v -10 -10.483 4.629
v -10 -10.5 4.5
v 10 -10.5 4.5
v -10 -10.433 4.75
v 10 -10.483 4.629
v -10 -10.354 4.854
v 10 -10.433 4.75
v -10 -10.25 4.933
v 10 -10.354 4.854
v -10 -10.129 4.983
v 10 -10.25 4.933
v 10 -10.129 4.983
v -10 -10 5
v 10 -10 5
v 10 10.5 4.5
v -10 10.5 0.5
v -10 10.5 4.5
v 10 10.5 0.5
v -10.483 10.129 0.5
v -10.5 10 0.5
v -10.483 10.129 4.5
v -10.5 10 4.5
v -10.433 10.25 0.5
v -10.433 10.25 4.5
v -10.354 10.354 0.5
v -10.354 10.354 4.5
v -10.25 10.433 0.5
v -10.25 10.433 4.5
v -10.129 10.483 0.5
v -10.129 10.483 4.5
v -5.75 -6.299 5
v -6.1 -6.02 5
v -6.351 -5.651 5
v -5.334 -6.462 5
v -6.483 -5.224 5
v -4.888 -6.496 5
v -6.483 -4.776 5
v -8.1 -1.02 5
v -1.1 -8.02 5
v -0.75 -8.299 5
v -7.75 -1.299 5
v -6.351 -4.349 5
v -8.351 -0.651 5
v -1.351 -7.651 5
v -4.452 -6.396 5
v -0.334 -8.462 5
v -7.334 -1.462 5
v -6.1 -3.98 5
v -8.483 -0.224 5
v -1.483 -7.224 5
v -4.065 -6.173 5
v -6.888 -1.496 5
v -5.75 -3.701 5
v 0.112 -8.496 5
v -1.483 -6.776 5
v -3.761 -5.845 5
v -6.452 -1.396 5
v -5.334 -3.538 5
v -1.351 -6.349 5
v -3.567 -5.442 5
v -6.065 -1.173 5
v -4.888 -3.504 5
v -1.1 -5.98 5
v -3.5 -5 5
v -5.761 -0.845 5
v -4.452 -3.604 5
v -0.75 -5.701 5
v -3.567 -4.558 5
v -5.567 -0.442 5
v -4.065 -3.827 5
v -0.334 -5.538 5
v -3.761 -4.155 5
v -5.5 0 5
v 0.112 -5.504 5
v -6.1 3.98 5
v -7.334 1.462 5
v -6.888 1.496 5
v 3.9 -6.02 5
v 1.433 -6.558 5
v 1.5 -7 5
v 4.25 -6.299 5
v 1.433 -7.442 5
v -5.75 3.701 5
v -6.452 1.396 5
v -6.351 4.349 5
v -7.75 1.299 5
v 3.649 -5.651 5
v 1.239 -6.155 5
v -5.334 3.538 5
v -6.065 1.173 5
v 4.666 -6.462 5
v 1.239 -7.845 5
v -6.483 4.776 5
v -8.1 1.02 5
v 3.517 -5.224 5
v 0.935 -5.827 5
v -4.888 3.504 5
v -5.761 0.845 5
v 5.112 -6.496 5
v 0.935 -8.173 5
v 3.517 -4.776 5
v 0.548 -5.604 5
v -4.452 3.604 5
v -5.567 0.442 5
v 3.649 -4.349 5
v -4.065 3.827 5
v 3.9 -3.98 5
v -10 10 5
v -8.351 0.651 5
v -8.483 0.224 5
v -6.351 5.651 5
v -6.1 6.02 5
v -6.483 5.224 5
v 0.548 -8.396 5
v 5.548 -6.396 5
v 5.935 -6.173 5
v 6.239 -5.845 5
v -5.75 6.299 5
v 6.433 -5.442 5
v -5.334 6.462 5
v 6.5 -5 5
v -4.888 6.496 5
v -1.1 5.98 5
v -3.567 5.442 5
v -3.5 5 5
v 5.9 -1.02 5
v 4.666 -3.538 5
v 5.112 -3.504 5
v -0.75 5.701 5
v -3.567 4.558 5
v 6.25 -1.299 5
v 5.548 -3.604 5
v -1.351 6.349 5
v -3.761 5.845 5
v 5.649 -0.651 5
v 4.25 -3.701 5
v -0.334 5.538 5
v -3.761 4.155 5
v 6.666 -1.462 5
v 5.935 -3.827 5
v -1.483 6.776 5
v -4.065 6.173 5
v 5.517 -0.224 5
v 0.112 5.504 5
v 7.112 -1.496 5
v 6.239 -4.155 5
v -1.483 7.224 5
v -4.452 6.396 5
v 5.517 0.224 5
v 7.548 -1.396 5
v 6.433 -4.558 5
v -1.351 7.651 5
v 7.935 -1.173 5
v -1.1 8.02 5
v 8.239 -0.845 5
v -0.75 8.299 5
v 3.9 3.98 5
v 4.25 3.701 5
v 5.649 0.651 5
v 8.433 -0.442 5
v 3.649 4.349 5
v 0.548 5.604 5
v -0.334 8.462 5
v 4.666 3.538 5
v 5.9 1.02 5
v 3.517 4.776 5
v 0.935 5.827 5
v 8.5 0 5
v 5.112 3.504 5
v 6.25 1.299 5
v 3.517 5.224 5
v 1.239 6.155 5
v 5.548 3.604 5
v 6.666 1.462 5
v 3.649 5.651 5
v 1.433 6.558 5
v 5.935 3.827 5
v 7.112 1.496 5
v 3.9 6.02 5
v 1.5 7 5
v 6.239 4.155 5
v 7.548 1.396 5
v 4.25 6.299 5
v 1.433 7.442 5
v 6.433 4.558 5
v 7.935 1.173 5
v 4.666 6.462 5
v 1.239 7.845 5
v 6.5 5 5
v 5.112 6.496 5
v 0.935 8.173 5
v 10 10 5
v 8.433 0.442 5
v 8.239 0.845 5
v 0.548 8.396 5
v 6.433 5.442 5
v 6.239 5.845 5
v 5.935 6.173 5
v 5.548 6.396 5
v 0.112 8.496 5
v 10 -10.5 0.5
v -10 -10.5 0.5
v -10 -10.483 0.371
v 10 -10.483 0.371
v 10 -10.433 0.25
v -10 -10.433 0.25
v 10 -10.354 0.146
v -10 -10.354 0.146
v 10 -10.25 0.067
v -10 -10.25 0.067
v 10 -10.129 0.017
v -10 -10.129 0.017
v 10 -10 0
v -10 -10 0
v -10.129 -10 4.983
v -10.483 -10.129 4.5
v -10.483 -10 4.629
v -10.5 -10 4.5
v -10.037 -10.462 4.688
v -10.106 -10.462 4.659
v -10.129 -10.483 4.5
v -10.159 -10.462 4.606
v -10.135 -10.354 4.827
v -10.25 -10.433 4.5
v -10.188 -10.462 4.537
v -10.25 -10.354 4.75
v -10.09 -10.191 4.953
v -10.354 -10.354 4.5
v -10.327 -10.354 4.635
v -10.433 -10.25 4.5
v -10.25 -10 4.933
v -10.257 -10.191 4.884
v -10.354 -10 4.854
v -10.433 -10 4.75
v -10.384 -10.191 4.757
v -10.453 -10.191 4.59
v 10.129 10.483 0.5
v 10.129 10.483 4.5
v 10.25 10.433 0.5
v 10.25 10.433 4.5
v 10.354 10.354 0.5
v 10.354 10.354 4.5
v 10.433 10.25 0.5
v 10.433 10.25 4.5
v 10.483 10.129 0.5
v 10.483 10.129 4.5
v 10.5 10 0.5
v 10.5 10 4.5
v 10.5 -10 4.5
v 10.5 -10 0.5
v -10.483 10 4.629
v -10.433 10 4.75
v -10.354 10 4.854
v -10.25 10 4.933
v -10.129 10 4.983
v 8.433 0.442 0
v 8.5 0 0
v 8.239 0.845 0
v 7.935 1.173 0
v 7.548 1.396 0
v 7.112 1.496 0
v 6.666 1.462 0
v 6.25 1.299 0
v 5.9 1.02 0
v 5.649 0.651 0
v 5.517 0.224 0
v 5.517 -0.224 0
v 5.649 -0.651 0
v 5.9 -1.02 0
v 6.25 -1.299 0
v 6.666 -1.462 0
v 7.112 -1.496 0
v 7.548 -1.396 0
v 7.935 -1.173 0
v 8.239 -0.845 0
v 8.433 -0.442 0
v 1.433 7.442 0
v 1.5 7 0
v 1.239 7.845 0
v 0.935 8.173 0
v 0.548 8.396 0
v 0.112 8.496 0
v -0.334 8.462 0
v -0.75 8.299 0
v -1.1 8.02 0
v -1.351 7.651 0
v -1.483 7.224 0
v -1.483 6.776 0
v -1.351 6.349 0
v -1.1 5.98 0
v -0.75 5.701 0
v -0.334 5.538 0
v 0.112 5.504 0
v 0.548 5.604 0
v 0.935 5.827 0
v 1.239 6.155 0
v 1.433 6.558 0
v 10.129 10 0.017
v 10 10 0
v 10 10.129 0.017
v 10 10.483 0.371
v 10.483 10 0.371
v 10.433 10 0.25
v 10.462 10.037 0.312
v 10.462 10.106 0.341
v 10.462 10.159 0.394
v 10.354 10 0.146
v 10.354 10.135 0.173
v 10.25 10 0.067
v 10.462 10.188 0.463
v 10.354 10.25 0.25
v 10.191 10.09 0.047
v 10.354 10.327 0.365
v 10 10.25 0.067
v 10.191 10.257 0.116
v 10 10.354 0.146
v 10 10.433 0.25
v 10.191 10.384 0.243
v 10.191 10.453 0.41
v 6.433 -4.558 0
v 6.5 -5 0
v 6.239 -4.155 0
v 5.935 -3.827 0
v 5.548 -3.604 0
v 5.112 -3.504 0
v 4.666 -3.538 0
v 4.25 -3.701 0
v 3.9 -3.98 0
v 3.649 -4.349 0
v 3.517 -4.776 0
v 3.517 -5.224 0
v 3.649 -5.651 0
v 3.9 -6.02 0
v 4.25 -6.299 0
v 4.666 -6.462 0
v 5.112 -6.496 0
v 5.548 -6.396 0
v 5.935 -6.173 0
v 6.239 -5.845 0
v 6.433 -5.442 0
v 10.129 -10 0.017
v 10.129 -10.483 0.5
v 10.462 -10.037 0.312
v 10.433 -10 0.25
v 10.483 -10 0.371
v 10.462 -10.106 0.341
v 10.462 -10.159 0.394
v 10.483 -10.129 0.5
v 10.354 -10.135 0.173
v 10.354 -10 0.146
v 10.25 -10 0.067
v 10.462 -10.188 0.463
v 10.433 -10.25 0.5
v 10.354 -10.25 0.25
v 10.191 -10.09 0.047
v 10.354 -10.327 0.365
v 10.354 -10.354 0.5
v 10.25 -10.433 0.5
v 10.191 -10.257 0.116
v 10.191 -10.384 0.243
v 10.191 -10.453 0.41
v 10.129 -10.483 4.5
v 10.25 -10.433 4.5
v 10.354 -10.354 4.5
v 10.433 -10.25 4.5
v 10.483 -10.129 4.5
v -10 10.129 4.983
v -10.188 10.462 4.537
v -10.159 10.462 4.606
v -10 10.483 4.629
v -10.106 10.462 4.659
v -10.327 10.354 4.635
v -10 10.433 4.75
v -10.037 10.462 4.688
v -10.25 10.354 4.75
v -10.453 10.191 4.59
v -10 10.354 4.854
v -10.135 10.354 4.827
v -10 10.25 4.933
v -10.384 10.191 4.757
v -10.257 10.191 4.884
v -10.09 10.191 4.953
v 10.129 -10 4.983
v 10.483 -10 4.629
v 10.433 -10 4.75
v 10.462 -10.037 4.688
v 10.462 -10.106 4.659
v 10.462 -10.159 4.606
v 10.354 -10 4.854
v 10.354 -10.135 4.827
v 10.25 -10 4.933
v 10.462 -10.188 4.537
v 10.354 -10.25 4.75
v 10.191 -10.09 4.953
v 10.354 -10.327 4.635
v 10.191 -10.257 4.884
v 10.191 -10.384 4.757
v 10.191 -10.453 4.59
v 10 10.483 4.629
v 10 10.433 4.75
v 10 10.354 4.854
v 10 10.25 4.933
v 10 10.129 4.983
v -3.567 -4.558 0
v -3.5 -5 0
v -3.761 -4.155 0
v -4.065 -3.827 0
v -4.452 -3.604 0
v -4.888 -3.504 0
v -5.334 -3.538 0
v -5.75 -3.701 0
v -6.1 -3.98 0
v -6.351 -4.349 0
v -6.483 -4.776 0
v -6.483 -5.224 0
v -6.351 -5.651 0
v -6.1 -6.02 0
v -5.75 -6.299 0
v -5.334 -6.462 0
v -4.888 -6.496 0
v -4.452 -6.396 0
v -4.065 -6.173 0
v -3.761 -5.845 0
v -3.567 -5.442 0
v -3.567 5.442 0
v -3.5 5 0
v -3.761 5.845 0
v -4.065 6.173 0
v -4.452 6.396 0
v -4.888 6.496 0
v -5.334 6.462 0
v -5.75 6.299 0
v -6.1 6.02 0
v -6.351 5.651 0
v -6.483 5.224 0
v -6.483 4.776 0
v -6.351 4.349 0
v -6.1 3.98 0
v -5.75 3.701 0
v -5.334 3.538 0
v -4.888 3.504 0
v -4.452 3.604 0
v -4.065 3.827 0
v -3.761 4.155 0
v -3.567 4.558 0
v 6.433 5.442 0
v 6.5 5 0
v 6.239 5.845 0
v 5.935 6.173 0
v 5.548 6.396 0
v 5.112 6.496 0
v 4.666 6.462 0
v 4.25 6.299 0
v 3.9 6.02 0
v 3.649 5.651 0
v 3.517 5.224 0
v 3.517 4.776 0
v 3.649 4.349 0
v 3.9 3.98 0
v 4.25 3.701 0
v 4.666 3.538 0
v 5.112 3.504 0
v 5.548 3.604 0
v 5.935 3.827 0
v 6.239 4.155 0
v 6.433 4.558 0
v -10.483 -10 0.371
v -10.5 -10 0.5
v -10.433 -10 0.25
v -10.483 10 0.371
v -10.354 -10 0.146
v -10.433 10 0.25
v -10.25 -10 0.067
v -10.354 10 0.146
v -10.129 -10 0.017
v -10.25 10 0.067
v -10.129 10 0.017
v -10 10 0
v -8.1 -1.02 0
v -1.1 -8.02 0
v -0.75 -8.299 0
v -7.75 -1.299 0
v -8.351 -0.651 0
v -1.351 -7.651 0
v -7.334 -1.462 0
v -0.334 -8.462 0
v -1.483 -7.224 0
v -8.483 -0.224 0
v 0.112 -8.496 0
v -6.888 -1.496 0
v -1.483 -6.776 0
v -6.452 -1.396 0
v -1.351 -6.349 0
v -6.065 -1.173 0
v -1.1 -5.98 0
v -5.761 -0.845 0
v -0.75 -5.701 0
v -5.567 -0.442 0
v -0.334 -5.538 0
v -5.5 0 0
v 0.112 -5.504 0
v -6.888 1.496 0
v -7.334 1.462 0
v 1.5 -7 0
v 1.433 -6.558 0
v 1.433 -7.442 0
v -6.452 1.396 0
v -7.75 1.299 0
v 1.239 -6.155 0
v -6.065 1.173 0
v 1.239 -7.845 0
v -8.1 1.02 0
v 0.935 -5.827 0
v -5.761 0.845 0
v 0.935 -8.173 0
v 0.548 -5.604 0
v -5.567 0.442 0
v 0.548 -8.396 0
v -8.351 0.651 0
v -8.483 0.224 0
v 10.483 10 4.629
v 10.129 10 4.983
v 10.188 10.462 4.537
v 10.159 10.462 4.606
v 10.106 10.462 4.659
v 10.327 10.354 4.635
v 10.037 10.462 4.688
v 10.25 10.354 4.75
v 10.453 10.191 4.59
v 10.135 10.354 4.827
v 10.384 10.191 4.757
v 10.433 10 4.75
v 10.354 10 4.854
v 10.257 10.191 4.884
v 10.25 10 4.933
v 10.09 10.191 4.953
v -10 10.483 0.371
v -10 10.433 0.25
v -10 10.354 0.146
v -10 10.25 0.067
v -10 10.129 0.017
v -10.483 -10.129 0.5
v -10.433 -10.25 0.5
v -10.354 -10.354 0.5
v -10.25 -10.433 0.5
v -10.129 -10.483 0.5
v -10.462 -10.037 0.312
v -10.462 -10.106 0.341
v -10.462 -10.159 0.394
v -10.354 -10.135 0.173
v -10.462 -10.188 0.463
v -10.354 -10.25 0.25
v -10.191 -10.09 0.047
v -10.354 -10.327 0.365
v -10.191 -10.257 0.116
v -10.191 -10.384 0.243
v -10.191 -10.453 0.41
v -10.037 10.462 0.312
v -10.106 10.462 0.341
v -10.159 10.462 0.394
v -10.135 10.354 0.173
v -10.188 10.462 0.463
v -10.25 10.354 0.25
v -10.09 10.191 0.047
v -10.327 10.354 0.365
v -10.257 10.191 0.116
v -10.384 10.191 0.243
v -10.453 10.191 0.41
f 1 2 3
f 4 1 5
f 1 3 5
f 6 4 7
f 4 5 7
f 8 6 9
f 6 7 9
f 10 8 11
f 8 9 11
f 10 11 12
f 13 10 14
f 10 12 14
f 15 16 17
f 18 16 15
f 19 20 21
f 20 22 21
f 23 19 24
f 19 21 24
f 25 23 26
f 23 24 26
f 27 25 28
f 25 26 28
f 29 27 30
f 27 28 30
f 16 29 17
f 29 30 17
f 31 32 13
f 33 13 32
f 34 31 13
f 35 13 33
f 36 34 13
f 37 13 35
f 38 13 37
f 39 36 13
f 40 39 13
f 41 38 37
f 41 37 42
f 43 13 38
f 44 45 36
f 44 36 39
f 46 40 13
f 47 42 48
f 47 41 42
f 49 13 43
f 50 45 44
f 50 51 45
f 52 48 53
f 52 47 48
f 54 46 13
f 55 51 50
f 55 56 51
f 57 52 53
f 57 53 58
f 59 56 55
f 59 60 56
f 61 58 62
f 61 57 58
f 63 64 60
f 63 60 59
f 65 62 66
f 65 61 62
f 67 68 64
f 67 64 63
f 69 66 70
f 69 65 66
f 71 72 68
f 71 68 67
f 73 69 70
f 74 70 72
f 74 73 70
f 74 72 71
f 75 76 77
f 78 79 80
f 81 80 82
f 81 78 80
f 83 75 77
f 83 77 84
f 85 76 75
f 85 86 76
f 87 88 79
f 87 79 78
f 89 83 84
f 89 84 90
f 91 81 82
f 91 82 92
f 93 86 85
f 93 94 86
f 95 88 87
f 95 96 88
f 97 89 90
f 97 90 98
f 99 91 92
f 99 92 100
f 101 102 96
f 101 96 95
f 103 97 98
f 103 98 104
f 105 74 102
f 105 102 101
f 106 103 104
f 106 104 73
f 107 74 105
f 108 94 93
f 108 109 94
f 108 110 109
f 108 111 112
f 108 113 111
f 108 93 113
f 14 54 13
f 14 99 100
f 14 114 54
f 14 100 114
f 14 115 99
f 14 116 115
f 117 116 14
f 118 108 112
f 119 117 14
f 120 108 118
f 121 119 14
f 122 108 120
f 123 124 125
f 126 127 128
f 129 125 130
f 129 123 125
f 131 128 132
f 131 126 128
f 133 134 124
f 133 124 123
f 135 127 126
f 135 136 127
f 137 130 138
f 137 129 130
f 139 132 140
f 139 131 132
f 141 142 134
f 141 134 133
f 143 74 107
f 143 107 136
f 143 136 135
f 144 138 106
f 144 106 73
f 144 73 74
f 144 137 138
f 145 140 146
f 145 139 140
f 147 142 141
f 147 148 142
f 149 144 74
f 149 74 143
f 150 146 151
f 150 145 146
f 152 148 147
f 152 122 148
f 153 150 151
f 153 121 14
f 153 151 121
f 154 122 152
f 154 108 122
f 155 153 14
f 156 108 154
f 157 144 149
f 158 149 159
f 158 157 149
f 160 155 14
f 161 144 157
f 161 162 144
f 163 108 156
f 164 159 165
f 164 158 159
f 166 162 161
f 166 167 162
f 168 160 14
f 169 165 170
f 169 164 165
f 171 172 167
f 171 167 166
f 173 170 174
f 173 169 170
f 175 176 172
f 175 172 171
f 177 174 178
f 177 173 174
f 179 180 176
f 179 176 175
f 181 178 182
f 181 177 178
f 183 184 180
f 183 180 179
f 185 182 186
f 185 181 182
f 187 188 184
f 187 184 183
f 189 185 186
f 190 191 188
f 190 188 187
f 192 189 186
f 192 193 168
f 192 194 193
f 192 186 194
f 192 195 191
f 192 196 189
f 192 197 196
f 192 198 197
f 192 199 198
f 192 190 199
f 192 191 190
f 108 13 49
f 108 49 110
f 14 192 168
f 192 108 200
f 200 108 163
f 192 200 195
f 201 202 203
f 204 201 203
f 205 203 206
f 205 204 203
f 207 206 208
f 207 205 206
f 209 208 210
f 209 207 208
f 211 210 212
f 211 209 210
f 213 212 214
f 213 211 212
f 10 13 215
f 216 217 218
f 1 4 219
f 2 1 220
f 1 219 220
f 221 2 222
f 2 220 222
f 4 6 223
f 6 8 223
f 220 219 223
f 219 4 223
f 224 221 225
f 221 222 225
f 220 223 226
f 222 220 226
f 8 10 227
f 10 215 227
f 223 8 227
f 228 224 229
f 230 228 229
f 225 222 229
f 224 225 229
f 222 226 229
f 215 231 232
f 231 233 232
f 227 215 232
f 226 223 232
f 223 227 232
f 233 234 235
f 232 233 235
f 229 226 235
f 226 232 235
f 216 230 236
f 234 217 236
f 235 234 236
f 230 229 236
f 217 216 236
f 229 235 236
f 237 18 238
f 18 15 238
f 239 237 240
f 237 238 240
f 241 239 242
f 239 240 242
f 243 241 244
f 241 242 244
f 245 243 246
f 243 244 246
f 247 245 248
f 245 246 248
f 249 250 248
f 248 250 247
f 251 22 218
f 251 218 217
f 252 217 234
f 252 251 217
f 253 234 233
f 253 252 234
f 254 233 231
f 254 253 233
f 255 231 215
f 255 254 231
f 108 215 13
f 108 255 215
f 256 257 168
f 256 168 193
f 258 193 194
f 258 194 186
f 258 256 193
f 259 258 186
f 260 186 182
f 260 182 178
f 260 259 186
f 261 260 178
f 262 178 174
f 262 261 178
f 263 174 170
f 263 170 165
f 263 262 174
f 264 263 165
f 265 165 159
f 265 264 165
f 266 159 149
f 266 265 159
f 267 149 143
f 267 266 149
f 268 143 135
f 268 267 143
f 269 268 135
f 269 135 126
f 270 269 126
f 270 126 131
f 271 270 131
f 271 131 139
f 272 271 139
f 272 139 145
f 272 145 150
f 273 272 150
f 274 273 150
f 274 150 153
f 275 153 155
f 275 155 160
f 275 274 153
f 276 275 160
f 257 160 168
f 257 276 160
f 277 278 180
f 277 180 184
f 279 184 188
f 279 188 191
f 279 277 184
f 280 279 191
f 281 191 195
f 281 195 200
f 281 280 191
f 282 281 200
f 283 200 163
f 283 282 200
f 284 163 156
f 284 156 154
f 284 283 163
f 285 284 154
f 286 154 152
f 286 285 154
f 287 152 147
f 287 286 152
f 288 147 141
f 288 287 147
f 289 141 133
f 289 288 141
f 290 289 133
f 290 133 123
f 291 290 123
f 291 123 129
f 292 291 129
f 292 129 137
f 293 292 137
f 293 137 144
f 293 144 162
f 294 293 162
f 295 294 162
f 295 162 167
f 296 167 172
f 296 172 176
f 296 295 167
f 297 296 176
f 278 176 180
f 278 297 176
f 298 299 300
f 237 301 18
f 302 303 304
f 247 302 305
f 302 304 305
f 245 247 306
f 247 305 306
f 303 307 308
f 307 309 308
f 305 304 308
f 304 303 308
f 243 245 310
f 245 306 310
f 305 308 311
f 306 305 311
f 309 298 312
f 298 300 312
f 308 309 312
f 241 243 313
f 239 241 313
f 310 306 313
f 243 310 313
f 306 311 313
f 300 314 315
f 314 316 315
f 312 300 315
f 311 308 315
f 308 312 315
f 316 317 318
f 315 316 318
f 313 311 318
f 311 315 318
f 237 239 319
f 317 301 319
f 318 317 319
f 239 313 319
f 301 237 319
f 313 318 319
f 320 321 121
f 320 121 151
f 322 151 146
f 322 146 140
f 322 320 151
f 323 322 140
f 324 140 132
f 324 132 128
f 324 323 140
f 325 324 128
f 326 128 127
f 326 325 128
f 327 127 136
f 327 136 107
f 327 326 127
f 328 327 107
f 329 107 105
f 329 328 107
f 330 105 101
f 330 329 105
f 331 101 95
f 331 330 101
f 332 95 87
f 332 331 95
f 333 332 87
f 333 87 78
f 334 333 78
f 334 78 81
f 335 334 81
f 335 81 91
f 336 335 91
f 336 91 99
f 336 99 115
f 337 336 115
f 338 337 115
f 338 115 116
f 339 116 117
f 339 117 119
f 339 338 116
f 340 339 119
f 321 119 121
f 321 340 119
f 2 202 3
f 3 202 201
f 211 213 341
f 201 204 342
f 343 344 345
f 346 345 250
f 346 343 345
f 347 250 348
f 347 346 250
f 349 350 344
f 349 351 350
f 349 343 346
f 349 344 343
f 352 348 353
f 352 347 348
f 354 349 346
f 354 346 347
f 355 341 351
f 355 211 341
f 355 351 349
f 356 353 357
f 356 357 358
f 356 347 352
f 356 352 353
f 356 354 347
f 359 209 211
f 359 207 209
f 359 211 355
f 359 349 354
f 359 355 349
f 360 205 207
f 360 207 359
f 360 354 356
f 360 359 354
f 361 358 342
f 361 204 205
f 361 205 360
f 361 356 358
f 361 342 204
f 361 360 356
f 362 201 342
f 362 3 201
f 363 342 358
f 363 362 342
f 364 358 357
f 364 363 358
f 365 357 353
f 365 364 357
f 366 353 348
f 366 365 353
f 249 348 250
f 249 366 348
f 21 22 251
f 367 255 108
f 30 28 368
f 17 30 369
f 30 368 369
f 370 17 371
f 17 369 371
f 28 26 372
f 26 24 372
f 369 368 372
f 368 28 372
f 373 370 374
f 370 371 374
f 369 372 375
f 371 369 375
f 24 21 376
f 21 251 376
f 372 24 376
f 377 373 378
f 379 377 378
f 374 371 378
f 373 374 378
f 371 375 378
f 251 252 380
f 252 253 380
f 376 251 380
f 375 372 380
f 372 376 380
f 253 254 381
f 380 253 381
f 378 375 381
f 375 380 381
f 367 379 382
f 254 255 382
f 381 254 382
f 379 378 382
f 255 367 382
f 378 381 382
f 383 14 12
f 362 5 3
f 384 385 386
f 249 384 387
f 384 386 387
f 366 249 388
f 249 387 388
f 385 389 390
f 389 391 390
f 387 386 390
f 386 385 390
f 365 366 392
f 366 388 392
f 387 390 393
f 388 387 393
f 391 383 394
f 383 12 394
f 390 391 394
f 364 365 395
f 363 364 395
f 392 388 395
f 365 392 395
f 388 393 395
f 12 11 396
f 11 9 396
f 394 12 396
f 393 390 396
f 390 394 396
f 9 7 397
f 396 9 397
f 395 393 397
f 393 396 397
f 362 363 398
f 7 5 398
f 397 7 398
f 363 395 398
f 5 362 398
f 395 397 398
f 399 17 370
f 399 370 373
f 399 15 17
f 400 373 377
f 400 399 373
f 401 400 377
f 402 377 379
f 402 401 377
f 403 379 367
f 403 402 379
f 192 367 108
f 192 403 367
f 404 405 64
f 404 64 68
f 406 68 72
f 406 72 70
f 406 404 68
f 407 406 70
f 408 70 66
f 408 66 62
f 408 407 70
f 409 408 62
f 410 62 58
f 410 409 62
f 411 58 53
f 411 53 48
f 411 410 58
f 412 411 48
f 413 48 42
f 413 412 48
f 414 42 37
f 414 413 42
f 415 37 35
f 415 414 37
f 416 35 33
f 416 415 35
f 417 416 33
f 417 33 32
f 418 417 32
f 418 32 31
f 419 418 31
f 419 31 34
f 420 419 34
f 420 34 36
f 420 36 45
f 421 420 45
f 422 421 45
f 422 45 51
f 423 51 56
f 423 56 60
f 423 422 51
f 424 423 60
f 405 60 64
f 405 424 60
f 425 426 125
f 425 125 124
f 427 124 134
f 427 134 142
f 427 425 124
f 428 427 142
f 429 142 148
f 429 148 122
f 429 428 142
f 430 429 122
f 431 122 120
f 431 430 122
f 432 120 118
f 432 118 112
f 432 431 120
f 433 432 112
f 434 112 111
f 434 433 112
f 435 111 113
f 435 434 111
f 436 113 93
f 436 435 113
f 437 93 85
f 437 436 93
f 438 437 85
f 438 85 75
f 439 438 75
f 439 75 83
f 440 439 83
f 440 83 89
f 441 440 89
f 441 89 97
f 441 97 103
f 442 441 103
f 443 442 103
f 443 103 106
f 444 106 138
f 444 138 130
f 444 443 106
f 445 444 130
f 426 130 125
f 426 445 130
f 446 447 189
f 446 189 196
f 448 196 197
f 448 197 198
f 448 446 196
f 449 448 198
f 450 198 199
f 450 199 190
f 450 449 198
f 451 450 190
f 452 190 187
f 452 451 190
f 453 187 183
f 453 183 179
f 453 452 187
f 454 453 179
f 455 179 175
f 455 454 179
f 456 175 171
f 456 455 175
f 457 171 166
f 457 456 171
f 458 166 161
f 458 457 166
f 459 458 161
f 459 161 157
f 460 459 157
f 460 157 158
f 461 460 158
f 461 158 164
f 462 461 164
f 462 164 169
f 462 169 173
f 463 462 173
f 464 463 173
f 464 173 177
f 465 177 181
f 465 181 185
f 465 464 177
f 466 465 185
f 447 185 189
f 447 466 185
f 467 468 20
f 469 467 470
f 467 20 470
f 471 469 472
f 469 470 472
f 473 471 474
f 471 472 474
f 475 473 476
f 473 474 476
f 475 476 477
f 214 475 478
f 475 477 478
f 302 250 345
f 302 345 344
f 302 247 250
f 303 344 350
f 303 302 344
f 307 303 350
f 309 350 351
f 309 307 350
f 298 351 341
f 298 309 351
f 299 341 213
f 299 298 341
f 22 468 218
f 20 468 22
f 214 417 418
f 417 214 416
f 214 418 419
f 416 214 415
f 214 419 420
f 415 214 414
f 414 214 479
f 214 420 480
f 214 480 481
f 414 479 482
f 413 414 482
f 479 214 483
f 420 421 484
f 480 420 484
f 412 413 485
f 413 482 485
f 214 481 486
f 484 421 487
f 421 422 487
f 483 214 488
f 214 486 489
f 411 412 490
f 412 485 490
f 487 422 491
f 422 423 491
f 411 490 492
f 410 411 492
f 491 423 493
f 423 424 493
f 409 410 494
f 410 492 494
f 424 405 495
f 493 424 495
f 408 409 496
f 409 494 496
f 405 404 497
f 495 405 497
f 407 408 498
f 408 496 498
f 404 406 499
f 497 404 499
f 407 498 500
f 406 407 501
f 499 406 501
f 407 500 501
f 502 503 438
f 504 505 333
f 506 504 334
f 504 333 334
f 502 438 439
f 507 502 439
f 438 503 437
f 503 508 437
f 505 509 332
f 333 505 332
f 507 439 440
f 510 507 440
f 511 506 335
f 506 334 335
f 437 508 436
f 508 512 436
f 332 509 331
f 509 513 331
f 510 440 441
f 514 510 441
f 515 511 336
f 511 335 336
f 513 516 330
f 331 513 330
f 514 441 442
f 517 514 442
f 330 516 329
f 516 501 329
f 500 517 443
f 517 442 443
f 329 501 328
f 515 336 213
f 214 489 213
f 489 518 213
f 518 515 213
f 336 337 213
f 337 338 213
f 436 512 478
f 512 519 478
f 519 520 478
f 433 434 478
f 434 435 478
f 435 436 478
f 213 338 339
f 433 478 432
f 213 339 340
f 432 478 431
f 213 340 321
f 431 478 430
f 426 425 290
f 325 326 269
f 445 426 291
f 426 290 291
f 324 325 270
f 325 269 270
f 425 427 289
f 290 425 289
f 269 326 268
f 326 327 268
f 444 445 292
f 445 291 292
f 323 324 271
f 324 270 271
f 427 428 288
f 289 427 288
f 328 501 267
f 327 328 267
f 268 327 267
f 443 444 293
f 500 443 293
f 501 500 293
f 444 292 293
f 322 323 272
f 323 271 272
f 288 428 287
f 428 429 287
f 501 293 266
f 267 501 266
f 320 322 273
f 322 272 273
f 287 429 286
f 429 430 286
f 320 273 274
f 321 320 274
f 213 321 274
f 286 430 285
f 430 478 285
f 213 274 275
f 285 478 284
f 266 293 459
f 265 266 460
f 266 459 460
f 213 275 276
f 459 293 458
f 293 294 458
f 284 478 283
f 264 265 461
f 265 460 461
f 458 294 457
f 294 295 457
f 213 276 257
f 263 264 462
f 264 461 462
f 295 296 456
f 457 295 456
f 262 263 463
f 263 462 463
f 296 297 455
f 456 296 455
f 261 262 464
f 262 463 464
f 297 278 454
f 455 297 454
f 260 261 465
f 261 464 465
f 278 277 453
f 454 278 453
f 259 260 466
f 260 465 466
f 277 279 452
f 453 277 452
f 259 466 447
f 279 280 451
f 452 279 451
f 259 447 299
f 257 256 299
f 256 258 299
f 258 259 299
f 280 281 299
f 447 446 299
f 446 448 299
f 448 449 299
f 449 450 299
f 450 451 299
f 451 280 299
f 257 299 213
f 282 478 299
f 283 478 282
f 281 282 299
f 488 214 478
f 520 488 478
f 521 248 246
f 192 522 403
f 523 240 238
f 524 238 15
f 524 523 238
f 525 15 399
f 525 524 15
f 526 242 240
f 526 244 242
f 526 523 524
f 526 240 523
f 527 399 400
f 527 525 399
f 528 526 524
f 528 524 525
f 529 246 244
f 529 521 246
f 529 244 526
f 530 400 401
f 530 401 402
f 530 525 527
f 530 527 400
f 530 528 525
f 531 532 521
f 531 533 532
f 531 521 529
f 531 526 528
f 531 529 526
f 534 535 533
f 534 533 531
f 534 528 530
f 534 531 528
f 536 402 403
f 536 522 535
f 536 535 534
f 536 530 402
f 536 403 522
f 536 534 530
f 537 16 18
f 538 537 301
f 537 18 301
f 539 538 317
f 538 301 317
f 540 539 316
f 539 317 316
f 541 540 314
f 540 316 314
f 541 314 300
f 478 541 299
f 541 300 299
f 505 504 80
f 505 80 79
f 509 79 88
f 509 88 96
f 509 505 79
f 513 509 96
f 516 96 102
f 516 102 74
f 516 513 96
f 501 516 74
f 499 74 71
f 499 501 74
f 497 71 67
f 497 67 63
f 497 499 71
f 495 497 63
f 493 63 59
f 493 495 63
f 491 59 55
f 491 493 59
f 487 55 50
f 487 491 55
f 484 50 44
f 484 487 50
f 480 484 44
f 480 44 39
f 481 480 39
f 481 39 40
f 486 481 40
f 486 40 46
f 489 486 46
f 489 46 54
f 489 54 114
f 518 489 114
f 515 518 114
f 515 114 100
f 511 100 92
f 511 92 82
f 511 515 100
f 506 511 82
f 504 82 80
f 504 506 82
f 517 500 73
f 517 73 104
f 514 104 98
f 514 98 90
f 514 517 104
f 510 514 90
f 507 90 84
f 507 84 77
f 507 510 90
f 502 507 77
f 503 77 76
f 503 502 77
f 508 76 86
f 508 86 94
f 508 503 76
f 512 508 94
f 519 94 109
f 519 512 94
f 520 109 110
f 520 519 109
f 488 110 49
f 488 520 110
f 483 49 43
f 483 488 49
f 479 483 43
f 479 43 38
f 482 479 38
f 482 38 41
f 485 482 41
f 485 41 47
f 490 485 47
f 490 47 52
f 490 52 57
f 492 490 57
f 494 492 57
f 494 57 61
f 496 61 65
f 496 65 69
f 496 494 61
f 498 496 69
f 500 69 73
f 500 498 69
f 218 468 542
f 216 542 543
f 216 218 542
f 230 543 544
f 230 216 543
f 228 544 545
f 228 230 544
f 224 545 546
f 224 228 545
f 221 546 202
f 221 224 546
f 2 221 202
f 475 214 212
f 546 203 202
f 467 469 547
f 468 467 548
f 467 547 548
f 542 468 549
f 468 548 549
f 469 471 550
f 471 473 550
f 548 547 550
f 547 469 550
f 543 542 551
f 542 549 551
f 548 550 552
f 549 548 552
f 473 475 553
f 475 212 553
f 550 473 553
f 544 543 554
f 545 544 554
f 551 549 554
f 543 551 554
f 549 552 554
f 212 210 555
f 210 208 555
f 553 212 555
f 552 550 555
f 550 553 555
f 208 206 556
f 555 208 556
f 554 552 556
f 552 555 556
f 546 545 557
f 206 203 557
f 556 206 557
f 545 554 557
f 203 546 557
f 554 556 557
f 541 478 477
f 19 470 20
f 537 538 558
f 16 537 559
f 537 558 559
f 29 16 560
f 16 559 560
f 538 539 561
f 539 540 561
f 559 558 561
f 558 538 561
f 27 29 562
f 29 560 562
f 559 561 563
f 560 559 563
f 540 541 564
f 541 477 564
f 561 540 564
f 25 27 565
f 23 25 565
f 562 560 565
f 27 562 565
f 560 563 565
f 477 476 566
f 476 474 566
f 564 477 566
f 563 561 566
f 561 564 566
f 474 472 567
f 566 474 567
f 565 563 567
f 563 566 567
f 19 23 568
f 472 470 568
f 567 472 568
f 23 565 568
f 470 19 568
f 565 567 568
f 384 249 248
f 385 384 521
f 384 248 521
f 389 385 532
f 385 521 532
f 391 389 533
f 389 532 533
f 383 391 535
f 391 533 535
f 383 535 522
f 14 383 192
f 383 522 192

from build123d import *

# Parameters (mm, degrees)
SKETCH1_W           = 21
SKETCH1_H           = 21
SKETCH1_R           = 1.5
BOSS_EXTRUDE1_DEPTH = 5
FILLET1_R           = 0.5


with BuildPart() as part:
    # Sketch1 → Boss-Extrude1 (new body)
    with BuildSketch(Plane.XY):
        Rectangle(SKETCH1_W, SKETCH1_H)
        with Locations((-5.000000296, 5.000000296)):
            Circle(SKETCH1_R, mode=Mode.SUBTRACT)
        with Locations((4.999999704, 4.999999704)):
            Circle(SKETCH1_R, mode=Mode.SUBTRACT)
        with Locations((5.000000296, -5.000000296)):
            Circle(SKETCH1_R, mode=Mode.SUBTRACT)
        with Locations((-4.999999704, -4.999999704)):
            Circle(SKETCH1_R, mode=Mode.SUBTRACT)
        with Locations((0, 7)):
            Circle(SKETCH1_R, mode=Mode.SUBTRACT)
        with Locations((7, 0)):
            Circle(SKETCH1_R, mode=Mode.SUBTRACT)
        with Locations((-7, 0)):
            Circle(SKETCH1_R, mode=Mode.SUBTRACT)
        with Locations((0, -7)):
            Circle(SKETCH1_R, mode=Mode.SUBTRACT)
    extrude(amount=BOSS_EXTRUDE1_DEPTH)

    # Fillet1
    fillet1_edges = [part.edges().sort_by_distance(p)[0] for p in [
        (-10.5, 0, 5),
        (0, -10.5, 5),
        (10.5, 0, 5),
        (0, -10.5, 0),
        (-10.5, 0, 0),
        (0, 10.5, 0),
        (10.5, 0, 0),
        (10.5, -10.5, 2.5),
        (-10.5, -10.5, 2.5),
        (-10.5, 10.5, 2.5),
        (10.5, 10.5, 2.5),
        (0, 10.5, 5),
    ]]
    fillet(fillet1_edges, radius=FILLET1_R)


solid = part.part
